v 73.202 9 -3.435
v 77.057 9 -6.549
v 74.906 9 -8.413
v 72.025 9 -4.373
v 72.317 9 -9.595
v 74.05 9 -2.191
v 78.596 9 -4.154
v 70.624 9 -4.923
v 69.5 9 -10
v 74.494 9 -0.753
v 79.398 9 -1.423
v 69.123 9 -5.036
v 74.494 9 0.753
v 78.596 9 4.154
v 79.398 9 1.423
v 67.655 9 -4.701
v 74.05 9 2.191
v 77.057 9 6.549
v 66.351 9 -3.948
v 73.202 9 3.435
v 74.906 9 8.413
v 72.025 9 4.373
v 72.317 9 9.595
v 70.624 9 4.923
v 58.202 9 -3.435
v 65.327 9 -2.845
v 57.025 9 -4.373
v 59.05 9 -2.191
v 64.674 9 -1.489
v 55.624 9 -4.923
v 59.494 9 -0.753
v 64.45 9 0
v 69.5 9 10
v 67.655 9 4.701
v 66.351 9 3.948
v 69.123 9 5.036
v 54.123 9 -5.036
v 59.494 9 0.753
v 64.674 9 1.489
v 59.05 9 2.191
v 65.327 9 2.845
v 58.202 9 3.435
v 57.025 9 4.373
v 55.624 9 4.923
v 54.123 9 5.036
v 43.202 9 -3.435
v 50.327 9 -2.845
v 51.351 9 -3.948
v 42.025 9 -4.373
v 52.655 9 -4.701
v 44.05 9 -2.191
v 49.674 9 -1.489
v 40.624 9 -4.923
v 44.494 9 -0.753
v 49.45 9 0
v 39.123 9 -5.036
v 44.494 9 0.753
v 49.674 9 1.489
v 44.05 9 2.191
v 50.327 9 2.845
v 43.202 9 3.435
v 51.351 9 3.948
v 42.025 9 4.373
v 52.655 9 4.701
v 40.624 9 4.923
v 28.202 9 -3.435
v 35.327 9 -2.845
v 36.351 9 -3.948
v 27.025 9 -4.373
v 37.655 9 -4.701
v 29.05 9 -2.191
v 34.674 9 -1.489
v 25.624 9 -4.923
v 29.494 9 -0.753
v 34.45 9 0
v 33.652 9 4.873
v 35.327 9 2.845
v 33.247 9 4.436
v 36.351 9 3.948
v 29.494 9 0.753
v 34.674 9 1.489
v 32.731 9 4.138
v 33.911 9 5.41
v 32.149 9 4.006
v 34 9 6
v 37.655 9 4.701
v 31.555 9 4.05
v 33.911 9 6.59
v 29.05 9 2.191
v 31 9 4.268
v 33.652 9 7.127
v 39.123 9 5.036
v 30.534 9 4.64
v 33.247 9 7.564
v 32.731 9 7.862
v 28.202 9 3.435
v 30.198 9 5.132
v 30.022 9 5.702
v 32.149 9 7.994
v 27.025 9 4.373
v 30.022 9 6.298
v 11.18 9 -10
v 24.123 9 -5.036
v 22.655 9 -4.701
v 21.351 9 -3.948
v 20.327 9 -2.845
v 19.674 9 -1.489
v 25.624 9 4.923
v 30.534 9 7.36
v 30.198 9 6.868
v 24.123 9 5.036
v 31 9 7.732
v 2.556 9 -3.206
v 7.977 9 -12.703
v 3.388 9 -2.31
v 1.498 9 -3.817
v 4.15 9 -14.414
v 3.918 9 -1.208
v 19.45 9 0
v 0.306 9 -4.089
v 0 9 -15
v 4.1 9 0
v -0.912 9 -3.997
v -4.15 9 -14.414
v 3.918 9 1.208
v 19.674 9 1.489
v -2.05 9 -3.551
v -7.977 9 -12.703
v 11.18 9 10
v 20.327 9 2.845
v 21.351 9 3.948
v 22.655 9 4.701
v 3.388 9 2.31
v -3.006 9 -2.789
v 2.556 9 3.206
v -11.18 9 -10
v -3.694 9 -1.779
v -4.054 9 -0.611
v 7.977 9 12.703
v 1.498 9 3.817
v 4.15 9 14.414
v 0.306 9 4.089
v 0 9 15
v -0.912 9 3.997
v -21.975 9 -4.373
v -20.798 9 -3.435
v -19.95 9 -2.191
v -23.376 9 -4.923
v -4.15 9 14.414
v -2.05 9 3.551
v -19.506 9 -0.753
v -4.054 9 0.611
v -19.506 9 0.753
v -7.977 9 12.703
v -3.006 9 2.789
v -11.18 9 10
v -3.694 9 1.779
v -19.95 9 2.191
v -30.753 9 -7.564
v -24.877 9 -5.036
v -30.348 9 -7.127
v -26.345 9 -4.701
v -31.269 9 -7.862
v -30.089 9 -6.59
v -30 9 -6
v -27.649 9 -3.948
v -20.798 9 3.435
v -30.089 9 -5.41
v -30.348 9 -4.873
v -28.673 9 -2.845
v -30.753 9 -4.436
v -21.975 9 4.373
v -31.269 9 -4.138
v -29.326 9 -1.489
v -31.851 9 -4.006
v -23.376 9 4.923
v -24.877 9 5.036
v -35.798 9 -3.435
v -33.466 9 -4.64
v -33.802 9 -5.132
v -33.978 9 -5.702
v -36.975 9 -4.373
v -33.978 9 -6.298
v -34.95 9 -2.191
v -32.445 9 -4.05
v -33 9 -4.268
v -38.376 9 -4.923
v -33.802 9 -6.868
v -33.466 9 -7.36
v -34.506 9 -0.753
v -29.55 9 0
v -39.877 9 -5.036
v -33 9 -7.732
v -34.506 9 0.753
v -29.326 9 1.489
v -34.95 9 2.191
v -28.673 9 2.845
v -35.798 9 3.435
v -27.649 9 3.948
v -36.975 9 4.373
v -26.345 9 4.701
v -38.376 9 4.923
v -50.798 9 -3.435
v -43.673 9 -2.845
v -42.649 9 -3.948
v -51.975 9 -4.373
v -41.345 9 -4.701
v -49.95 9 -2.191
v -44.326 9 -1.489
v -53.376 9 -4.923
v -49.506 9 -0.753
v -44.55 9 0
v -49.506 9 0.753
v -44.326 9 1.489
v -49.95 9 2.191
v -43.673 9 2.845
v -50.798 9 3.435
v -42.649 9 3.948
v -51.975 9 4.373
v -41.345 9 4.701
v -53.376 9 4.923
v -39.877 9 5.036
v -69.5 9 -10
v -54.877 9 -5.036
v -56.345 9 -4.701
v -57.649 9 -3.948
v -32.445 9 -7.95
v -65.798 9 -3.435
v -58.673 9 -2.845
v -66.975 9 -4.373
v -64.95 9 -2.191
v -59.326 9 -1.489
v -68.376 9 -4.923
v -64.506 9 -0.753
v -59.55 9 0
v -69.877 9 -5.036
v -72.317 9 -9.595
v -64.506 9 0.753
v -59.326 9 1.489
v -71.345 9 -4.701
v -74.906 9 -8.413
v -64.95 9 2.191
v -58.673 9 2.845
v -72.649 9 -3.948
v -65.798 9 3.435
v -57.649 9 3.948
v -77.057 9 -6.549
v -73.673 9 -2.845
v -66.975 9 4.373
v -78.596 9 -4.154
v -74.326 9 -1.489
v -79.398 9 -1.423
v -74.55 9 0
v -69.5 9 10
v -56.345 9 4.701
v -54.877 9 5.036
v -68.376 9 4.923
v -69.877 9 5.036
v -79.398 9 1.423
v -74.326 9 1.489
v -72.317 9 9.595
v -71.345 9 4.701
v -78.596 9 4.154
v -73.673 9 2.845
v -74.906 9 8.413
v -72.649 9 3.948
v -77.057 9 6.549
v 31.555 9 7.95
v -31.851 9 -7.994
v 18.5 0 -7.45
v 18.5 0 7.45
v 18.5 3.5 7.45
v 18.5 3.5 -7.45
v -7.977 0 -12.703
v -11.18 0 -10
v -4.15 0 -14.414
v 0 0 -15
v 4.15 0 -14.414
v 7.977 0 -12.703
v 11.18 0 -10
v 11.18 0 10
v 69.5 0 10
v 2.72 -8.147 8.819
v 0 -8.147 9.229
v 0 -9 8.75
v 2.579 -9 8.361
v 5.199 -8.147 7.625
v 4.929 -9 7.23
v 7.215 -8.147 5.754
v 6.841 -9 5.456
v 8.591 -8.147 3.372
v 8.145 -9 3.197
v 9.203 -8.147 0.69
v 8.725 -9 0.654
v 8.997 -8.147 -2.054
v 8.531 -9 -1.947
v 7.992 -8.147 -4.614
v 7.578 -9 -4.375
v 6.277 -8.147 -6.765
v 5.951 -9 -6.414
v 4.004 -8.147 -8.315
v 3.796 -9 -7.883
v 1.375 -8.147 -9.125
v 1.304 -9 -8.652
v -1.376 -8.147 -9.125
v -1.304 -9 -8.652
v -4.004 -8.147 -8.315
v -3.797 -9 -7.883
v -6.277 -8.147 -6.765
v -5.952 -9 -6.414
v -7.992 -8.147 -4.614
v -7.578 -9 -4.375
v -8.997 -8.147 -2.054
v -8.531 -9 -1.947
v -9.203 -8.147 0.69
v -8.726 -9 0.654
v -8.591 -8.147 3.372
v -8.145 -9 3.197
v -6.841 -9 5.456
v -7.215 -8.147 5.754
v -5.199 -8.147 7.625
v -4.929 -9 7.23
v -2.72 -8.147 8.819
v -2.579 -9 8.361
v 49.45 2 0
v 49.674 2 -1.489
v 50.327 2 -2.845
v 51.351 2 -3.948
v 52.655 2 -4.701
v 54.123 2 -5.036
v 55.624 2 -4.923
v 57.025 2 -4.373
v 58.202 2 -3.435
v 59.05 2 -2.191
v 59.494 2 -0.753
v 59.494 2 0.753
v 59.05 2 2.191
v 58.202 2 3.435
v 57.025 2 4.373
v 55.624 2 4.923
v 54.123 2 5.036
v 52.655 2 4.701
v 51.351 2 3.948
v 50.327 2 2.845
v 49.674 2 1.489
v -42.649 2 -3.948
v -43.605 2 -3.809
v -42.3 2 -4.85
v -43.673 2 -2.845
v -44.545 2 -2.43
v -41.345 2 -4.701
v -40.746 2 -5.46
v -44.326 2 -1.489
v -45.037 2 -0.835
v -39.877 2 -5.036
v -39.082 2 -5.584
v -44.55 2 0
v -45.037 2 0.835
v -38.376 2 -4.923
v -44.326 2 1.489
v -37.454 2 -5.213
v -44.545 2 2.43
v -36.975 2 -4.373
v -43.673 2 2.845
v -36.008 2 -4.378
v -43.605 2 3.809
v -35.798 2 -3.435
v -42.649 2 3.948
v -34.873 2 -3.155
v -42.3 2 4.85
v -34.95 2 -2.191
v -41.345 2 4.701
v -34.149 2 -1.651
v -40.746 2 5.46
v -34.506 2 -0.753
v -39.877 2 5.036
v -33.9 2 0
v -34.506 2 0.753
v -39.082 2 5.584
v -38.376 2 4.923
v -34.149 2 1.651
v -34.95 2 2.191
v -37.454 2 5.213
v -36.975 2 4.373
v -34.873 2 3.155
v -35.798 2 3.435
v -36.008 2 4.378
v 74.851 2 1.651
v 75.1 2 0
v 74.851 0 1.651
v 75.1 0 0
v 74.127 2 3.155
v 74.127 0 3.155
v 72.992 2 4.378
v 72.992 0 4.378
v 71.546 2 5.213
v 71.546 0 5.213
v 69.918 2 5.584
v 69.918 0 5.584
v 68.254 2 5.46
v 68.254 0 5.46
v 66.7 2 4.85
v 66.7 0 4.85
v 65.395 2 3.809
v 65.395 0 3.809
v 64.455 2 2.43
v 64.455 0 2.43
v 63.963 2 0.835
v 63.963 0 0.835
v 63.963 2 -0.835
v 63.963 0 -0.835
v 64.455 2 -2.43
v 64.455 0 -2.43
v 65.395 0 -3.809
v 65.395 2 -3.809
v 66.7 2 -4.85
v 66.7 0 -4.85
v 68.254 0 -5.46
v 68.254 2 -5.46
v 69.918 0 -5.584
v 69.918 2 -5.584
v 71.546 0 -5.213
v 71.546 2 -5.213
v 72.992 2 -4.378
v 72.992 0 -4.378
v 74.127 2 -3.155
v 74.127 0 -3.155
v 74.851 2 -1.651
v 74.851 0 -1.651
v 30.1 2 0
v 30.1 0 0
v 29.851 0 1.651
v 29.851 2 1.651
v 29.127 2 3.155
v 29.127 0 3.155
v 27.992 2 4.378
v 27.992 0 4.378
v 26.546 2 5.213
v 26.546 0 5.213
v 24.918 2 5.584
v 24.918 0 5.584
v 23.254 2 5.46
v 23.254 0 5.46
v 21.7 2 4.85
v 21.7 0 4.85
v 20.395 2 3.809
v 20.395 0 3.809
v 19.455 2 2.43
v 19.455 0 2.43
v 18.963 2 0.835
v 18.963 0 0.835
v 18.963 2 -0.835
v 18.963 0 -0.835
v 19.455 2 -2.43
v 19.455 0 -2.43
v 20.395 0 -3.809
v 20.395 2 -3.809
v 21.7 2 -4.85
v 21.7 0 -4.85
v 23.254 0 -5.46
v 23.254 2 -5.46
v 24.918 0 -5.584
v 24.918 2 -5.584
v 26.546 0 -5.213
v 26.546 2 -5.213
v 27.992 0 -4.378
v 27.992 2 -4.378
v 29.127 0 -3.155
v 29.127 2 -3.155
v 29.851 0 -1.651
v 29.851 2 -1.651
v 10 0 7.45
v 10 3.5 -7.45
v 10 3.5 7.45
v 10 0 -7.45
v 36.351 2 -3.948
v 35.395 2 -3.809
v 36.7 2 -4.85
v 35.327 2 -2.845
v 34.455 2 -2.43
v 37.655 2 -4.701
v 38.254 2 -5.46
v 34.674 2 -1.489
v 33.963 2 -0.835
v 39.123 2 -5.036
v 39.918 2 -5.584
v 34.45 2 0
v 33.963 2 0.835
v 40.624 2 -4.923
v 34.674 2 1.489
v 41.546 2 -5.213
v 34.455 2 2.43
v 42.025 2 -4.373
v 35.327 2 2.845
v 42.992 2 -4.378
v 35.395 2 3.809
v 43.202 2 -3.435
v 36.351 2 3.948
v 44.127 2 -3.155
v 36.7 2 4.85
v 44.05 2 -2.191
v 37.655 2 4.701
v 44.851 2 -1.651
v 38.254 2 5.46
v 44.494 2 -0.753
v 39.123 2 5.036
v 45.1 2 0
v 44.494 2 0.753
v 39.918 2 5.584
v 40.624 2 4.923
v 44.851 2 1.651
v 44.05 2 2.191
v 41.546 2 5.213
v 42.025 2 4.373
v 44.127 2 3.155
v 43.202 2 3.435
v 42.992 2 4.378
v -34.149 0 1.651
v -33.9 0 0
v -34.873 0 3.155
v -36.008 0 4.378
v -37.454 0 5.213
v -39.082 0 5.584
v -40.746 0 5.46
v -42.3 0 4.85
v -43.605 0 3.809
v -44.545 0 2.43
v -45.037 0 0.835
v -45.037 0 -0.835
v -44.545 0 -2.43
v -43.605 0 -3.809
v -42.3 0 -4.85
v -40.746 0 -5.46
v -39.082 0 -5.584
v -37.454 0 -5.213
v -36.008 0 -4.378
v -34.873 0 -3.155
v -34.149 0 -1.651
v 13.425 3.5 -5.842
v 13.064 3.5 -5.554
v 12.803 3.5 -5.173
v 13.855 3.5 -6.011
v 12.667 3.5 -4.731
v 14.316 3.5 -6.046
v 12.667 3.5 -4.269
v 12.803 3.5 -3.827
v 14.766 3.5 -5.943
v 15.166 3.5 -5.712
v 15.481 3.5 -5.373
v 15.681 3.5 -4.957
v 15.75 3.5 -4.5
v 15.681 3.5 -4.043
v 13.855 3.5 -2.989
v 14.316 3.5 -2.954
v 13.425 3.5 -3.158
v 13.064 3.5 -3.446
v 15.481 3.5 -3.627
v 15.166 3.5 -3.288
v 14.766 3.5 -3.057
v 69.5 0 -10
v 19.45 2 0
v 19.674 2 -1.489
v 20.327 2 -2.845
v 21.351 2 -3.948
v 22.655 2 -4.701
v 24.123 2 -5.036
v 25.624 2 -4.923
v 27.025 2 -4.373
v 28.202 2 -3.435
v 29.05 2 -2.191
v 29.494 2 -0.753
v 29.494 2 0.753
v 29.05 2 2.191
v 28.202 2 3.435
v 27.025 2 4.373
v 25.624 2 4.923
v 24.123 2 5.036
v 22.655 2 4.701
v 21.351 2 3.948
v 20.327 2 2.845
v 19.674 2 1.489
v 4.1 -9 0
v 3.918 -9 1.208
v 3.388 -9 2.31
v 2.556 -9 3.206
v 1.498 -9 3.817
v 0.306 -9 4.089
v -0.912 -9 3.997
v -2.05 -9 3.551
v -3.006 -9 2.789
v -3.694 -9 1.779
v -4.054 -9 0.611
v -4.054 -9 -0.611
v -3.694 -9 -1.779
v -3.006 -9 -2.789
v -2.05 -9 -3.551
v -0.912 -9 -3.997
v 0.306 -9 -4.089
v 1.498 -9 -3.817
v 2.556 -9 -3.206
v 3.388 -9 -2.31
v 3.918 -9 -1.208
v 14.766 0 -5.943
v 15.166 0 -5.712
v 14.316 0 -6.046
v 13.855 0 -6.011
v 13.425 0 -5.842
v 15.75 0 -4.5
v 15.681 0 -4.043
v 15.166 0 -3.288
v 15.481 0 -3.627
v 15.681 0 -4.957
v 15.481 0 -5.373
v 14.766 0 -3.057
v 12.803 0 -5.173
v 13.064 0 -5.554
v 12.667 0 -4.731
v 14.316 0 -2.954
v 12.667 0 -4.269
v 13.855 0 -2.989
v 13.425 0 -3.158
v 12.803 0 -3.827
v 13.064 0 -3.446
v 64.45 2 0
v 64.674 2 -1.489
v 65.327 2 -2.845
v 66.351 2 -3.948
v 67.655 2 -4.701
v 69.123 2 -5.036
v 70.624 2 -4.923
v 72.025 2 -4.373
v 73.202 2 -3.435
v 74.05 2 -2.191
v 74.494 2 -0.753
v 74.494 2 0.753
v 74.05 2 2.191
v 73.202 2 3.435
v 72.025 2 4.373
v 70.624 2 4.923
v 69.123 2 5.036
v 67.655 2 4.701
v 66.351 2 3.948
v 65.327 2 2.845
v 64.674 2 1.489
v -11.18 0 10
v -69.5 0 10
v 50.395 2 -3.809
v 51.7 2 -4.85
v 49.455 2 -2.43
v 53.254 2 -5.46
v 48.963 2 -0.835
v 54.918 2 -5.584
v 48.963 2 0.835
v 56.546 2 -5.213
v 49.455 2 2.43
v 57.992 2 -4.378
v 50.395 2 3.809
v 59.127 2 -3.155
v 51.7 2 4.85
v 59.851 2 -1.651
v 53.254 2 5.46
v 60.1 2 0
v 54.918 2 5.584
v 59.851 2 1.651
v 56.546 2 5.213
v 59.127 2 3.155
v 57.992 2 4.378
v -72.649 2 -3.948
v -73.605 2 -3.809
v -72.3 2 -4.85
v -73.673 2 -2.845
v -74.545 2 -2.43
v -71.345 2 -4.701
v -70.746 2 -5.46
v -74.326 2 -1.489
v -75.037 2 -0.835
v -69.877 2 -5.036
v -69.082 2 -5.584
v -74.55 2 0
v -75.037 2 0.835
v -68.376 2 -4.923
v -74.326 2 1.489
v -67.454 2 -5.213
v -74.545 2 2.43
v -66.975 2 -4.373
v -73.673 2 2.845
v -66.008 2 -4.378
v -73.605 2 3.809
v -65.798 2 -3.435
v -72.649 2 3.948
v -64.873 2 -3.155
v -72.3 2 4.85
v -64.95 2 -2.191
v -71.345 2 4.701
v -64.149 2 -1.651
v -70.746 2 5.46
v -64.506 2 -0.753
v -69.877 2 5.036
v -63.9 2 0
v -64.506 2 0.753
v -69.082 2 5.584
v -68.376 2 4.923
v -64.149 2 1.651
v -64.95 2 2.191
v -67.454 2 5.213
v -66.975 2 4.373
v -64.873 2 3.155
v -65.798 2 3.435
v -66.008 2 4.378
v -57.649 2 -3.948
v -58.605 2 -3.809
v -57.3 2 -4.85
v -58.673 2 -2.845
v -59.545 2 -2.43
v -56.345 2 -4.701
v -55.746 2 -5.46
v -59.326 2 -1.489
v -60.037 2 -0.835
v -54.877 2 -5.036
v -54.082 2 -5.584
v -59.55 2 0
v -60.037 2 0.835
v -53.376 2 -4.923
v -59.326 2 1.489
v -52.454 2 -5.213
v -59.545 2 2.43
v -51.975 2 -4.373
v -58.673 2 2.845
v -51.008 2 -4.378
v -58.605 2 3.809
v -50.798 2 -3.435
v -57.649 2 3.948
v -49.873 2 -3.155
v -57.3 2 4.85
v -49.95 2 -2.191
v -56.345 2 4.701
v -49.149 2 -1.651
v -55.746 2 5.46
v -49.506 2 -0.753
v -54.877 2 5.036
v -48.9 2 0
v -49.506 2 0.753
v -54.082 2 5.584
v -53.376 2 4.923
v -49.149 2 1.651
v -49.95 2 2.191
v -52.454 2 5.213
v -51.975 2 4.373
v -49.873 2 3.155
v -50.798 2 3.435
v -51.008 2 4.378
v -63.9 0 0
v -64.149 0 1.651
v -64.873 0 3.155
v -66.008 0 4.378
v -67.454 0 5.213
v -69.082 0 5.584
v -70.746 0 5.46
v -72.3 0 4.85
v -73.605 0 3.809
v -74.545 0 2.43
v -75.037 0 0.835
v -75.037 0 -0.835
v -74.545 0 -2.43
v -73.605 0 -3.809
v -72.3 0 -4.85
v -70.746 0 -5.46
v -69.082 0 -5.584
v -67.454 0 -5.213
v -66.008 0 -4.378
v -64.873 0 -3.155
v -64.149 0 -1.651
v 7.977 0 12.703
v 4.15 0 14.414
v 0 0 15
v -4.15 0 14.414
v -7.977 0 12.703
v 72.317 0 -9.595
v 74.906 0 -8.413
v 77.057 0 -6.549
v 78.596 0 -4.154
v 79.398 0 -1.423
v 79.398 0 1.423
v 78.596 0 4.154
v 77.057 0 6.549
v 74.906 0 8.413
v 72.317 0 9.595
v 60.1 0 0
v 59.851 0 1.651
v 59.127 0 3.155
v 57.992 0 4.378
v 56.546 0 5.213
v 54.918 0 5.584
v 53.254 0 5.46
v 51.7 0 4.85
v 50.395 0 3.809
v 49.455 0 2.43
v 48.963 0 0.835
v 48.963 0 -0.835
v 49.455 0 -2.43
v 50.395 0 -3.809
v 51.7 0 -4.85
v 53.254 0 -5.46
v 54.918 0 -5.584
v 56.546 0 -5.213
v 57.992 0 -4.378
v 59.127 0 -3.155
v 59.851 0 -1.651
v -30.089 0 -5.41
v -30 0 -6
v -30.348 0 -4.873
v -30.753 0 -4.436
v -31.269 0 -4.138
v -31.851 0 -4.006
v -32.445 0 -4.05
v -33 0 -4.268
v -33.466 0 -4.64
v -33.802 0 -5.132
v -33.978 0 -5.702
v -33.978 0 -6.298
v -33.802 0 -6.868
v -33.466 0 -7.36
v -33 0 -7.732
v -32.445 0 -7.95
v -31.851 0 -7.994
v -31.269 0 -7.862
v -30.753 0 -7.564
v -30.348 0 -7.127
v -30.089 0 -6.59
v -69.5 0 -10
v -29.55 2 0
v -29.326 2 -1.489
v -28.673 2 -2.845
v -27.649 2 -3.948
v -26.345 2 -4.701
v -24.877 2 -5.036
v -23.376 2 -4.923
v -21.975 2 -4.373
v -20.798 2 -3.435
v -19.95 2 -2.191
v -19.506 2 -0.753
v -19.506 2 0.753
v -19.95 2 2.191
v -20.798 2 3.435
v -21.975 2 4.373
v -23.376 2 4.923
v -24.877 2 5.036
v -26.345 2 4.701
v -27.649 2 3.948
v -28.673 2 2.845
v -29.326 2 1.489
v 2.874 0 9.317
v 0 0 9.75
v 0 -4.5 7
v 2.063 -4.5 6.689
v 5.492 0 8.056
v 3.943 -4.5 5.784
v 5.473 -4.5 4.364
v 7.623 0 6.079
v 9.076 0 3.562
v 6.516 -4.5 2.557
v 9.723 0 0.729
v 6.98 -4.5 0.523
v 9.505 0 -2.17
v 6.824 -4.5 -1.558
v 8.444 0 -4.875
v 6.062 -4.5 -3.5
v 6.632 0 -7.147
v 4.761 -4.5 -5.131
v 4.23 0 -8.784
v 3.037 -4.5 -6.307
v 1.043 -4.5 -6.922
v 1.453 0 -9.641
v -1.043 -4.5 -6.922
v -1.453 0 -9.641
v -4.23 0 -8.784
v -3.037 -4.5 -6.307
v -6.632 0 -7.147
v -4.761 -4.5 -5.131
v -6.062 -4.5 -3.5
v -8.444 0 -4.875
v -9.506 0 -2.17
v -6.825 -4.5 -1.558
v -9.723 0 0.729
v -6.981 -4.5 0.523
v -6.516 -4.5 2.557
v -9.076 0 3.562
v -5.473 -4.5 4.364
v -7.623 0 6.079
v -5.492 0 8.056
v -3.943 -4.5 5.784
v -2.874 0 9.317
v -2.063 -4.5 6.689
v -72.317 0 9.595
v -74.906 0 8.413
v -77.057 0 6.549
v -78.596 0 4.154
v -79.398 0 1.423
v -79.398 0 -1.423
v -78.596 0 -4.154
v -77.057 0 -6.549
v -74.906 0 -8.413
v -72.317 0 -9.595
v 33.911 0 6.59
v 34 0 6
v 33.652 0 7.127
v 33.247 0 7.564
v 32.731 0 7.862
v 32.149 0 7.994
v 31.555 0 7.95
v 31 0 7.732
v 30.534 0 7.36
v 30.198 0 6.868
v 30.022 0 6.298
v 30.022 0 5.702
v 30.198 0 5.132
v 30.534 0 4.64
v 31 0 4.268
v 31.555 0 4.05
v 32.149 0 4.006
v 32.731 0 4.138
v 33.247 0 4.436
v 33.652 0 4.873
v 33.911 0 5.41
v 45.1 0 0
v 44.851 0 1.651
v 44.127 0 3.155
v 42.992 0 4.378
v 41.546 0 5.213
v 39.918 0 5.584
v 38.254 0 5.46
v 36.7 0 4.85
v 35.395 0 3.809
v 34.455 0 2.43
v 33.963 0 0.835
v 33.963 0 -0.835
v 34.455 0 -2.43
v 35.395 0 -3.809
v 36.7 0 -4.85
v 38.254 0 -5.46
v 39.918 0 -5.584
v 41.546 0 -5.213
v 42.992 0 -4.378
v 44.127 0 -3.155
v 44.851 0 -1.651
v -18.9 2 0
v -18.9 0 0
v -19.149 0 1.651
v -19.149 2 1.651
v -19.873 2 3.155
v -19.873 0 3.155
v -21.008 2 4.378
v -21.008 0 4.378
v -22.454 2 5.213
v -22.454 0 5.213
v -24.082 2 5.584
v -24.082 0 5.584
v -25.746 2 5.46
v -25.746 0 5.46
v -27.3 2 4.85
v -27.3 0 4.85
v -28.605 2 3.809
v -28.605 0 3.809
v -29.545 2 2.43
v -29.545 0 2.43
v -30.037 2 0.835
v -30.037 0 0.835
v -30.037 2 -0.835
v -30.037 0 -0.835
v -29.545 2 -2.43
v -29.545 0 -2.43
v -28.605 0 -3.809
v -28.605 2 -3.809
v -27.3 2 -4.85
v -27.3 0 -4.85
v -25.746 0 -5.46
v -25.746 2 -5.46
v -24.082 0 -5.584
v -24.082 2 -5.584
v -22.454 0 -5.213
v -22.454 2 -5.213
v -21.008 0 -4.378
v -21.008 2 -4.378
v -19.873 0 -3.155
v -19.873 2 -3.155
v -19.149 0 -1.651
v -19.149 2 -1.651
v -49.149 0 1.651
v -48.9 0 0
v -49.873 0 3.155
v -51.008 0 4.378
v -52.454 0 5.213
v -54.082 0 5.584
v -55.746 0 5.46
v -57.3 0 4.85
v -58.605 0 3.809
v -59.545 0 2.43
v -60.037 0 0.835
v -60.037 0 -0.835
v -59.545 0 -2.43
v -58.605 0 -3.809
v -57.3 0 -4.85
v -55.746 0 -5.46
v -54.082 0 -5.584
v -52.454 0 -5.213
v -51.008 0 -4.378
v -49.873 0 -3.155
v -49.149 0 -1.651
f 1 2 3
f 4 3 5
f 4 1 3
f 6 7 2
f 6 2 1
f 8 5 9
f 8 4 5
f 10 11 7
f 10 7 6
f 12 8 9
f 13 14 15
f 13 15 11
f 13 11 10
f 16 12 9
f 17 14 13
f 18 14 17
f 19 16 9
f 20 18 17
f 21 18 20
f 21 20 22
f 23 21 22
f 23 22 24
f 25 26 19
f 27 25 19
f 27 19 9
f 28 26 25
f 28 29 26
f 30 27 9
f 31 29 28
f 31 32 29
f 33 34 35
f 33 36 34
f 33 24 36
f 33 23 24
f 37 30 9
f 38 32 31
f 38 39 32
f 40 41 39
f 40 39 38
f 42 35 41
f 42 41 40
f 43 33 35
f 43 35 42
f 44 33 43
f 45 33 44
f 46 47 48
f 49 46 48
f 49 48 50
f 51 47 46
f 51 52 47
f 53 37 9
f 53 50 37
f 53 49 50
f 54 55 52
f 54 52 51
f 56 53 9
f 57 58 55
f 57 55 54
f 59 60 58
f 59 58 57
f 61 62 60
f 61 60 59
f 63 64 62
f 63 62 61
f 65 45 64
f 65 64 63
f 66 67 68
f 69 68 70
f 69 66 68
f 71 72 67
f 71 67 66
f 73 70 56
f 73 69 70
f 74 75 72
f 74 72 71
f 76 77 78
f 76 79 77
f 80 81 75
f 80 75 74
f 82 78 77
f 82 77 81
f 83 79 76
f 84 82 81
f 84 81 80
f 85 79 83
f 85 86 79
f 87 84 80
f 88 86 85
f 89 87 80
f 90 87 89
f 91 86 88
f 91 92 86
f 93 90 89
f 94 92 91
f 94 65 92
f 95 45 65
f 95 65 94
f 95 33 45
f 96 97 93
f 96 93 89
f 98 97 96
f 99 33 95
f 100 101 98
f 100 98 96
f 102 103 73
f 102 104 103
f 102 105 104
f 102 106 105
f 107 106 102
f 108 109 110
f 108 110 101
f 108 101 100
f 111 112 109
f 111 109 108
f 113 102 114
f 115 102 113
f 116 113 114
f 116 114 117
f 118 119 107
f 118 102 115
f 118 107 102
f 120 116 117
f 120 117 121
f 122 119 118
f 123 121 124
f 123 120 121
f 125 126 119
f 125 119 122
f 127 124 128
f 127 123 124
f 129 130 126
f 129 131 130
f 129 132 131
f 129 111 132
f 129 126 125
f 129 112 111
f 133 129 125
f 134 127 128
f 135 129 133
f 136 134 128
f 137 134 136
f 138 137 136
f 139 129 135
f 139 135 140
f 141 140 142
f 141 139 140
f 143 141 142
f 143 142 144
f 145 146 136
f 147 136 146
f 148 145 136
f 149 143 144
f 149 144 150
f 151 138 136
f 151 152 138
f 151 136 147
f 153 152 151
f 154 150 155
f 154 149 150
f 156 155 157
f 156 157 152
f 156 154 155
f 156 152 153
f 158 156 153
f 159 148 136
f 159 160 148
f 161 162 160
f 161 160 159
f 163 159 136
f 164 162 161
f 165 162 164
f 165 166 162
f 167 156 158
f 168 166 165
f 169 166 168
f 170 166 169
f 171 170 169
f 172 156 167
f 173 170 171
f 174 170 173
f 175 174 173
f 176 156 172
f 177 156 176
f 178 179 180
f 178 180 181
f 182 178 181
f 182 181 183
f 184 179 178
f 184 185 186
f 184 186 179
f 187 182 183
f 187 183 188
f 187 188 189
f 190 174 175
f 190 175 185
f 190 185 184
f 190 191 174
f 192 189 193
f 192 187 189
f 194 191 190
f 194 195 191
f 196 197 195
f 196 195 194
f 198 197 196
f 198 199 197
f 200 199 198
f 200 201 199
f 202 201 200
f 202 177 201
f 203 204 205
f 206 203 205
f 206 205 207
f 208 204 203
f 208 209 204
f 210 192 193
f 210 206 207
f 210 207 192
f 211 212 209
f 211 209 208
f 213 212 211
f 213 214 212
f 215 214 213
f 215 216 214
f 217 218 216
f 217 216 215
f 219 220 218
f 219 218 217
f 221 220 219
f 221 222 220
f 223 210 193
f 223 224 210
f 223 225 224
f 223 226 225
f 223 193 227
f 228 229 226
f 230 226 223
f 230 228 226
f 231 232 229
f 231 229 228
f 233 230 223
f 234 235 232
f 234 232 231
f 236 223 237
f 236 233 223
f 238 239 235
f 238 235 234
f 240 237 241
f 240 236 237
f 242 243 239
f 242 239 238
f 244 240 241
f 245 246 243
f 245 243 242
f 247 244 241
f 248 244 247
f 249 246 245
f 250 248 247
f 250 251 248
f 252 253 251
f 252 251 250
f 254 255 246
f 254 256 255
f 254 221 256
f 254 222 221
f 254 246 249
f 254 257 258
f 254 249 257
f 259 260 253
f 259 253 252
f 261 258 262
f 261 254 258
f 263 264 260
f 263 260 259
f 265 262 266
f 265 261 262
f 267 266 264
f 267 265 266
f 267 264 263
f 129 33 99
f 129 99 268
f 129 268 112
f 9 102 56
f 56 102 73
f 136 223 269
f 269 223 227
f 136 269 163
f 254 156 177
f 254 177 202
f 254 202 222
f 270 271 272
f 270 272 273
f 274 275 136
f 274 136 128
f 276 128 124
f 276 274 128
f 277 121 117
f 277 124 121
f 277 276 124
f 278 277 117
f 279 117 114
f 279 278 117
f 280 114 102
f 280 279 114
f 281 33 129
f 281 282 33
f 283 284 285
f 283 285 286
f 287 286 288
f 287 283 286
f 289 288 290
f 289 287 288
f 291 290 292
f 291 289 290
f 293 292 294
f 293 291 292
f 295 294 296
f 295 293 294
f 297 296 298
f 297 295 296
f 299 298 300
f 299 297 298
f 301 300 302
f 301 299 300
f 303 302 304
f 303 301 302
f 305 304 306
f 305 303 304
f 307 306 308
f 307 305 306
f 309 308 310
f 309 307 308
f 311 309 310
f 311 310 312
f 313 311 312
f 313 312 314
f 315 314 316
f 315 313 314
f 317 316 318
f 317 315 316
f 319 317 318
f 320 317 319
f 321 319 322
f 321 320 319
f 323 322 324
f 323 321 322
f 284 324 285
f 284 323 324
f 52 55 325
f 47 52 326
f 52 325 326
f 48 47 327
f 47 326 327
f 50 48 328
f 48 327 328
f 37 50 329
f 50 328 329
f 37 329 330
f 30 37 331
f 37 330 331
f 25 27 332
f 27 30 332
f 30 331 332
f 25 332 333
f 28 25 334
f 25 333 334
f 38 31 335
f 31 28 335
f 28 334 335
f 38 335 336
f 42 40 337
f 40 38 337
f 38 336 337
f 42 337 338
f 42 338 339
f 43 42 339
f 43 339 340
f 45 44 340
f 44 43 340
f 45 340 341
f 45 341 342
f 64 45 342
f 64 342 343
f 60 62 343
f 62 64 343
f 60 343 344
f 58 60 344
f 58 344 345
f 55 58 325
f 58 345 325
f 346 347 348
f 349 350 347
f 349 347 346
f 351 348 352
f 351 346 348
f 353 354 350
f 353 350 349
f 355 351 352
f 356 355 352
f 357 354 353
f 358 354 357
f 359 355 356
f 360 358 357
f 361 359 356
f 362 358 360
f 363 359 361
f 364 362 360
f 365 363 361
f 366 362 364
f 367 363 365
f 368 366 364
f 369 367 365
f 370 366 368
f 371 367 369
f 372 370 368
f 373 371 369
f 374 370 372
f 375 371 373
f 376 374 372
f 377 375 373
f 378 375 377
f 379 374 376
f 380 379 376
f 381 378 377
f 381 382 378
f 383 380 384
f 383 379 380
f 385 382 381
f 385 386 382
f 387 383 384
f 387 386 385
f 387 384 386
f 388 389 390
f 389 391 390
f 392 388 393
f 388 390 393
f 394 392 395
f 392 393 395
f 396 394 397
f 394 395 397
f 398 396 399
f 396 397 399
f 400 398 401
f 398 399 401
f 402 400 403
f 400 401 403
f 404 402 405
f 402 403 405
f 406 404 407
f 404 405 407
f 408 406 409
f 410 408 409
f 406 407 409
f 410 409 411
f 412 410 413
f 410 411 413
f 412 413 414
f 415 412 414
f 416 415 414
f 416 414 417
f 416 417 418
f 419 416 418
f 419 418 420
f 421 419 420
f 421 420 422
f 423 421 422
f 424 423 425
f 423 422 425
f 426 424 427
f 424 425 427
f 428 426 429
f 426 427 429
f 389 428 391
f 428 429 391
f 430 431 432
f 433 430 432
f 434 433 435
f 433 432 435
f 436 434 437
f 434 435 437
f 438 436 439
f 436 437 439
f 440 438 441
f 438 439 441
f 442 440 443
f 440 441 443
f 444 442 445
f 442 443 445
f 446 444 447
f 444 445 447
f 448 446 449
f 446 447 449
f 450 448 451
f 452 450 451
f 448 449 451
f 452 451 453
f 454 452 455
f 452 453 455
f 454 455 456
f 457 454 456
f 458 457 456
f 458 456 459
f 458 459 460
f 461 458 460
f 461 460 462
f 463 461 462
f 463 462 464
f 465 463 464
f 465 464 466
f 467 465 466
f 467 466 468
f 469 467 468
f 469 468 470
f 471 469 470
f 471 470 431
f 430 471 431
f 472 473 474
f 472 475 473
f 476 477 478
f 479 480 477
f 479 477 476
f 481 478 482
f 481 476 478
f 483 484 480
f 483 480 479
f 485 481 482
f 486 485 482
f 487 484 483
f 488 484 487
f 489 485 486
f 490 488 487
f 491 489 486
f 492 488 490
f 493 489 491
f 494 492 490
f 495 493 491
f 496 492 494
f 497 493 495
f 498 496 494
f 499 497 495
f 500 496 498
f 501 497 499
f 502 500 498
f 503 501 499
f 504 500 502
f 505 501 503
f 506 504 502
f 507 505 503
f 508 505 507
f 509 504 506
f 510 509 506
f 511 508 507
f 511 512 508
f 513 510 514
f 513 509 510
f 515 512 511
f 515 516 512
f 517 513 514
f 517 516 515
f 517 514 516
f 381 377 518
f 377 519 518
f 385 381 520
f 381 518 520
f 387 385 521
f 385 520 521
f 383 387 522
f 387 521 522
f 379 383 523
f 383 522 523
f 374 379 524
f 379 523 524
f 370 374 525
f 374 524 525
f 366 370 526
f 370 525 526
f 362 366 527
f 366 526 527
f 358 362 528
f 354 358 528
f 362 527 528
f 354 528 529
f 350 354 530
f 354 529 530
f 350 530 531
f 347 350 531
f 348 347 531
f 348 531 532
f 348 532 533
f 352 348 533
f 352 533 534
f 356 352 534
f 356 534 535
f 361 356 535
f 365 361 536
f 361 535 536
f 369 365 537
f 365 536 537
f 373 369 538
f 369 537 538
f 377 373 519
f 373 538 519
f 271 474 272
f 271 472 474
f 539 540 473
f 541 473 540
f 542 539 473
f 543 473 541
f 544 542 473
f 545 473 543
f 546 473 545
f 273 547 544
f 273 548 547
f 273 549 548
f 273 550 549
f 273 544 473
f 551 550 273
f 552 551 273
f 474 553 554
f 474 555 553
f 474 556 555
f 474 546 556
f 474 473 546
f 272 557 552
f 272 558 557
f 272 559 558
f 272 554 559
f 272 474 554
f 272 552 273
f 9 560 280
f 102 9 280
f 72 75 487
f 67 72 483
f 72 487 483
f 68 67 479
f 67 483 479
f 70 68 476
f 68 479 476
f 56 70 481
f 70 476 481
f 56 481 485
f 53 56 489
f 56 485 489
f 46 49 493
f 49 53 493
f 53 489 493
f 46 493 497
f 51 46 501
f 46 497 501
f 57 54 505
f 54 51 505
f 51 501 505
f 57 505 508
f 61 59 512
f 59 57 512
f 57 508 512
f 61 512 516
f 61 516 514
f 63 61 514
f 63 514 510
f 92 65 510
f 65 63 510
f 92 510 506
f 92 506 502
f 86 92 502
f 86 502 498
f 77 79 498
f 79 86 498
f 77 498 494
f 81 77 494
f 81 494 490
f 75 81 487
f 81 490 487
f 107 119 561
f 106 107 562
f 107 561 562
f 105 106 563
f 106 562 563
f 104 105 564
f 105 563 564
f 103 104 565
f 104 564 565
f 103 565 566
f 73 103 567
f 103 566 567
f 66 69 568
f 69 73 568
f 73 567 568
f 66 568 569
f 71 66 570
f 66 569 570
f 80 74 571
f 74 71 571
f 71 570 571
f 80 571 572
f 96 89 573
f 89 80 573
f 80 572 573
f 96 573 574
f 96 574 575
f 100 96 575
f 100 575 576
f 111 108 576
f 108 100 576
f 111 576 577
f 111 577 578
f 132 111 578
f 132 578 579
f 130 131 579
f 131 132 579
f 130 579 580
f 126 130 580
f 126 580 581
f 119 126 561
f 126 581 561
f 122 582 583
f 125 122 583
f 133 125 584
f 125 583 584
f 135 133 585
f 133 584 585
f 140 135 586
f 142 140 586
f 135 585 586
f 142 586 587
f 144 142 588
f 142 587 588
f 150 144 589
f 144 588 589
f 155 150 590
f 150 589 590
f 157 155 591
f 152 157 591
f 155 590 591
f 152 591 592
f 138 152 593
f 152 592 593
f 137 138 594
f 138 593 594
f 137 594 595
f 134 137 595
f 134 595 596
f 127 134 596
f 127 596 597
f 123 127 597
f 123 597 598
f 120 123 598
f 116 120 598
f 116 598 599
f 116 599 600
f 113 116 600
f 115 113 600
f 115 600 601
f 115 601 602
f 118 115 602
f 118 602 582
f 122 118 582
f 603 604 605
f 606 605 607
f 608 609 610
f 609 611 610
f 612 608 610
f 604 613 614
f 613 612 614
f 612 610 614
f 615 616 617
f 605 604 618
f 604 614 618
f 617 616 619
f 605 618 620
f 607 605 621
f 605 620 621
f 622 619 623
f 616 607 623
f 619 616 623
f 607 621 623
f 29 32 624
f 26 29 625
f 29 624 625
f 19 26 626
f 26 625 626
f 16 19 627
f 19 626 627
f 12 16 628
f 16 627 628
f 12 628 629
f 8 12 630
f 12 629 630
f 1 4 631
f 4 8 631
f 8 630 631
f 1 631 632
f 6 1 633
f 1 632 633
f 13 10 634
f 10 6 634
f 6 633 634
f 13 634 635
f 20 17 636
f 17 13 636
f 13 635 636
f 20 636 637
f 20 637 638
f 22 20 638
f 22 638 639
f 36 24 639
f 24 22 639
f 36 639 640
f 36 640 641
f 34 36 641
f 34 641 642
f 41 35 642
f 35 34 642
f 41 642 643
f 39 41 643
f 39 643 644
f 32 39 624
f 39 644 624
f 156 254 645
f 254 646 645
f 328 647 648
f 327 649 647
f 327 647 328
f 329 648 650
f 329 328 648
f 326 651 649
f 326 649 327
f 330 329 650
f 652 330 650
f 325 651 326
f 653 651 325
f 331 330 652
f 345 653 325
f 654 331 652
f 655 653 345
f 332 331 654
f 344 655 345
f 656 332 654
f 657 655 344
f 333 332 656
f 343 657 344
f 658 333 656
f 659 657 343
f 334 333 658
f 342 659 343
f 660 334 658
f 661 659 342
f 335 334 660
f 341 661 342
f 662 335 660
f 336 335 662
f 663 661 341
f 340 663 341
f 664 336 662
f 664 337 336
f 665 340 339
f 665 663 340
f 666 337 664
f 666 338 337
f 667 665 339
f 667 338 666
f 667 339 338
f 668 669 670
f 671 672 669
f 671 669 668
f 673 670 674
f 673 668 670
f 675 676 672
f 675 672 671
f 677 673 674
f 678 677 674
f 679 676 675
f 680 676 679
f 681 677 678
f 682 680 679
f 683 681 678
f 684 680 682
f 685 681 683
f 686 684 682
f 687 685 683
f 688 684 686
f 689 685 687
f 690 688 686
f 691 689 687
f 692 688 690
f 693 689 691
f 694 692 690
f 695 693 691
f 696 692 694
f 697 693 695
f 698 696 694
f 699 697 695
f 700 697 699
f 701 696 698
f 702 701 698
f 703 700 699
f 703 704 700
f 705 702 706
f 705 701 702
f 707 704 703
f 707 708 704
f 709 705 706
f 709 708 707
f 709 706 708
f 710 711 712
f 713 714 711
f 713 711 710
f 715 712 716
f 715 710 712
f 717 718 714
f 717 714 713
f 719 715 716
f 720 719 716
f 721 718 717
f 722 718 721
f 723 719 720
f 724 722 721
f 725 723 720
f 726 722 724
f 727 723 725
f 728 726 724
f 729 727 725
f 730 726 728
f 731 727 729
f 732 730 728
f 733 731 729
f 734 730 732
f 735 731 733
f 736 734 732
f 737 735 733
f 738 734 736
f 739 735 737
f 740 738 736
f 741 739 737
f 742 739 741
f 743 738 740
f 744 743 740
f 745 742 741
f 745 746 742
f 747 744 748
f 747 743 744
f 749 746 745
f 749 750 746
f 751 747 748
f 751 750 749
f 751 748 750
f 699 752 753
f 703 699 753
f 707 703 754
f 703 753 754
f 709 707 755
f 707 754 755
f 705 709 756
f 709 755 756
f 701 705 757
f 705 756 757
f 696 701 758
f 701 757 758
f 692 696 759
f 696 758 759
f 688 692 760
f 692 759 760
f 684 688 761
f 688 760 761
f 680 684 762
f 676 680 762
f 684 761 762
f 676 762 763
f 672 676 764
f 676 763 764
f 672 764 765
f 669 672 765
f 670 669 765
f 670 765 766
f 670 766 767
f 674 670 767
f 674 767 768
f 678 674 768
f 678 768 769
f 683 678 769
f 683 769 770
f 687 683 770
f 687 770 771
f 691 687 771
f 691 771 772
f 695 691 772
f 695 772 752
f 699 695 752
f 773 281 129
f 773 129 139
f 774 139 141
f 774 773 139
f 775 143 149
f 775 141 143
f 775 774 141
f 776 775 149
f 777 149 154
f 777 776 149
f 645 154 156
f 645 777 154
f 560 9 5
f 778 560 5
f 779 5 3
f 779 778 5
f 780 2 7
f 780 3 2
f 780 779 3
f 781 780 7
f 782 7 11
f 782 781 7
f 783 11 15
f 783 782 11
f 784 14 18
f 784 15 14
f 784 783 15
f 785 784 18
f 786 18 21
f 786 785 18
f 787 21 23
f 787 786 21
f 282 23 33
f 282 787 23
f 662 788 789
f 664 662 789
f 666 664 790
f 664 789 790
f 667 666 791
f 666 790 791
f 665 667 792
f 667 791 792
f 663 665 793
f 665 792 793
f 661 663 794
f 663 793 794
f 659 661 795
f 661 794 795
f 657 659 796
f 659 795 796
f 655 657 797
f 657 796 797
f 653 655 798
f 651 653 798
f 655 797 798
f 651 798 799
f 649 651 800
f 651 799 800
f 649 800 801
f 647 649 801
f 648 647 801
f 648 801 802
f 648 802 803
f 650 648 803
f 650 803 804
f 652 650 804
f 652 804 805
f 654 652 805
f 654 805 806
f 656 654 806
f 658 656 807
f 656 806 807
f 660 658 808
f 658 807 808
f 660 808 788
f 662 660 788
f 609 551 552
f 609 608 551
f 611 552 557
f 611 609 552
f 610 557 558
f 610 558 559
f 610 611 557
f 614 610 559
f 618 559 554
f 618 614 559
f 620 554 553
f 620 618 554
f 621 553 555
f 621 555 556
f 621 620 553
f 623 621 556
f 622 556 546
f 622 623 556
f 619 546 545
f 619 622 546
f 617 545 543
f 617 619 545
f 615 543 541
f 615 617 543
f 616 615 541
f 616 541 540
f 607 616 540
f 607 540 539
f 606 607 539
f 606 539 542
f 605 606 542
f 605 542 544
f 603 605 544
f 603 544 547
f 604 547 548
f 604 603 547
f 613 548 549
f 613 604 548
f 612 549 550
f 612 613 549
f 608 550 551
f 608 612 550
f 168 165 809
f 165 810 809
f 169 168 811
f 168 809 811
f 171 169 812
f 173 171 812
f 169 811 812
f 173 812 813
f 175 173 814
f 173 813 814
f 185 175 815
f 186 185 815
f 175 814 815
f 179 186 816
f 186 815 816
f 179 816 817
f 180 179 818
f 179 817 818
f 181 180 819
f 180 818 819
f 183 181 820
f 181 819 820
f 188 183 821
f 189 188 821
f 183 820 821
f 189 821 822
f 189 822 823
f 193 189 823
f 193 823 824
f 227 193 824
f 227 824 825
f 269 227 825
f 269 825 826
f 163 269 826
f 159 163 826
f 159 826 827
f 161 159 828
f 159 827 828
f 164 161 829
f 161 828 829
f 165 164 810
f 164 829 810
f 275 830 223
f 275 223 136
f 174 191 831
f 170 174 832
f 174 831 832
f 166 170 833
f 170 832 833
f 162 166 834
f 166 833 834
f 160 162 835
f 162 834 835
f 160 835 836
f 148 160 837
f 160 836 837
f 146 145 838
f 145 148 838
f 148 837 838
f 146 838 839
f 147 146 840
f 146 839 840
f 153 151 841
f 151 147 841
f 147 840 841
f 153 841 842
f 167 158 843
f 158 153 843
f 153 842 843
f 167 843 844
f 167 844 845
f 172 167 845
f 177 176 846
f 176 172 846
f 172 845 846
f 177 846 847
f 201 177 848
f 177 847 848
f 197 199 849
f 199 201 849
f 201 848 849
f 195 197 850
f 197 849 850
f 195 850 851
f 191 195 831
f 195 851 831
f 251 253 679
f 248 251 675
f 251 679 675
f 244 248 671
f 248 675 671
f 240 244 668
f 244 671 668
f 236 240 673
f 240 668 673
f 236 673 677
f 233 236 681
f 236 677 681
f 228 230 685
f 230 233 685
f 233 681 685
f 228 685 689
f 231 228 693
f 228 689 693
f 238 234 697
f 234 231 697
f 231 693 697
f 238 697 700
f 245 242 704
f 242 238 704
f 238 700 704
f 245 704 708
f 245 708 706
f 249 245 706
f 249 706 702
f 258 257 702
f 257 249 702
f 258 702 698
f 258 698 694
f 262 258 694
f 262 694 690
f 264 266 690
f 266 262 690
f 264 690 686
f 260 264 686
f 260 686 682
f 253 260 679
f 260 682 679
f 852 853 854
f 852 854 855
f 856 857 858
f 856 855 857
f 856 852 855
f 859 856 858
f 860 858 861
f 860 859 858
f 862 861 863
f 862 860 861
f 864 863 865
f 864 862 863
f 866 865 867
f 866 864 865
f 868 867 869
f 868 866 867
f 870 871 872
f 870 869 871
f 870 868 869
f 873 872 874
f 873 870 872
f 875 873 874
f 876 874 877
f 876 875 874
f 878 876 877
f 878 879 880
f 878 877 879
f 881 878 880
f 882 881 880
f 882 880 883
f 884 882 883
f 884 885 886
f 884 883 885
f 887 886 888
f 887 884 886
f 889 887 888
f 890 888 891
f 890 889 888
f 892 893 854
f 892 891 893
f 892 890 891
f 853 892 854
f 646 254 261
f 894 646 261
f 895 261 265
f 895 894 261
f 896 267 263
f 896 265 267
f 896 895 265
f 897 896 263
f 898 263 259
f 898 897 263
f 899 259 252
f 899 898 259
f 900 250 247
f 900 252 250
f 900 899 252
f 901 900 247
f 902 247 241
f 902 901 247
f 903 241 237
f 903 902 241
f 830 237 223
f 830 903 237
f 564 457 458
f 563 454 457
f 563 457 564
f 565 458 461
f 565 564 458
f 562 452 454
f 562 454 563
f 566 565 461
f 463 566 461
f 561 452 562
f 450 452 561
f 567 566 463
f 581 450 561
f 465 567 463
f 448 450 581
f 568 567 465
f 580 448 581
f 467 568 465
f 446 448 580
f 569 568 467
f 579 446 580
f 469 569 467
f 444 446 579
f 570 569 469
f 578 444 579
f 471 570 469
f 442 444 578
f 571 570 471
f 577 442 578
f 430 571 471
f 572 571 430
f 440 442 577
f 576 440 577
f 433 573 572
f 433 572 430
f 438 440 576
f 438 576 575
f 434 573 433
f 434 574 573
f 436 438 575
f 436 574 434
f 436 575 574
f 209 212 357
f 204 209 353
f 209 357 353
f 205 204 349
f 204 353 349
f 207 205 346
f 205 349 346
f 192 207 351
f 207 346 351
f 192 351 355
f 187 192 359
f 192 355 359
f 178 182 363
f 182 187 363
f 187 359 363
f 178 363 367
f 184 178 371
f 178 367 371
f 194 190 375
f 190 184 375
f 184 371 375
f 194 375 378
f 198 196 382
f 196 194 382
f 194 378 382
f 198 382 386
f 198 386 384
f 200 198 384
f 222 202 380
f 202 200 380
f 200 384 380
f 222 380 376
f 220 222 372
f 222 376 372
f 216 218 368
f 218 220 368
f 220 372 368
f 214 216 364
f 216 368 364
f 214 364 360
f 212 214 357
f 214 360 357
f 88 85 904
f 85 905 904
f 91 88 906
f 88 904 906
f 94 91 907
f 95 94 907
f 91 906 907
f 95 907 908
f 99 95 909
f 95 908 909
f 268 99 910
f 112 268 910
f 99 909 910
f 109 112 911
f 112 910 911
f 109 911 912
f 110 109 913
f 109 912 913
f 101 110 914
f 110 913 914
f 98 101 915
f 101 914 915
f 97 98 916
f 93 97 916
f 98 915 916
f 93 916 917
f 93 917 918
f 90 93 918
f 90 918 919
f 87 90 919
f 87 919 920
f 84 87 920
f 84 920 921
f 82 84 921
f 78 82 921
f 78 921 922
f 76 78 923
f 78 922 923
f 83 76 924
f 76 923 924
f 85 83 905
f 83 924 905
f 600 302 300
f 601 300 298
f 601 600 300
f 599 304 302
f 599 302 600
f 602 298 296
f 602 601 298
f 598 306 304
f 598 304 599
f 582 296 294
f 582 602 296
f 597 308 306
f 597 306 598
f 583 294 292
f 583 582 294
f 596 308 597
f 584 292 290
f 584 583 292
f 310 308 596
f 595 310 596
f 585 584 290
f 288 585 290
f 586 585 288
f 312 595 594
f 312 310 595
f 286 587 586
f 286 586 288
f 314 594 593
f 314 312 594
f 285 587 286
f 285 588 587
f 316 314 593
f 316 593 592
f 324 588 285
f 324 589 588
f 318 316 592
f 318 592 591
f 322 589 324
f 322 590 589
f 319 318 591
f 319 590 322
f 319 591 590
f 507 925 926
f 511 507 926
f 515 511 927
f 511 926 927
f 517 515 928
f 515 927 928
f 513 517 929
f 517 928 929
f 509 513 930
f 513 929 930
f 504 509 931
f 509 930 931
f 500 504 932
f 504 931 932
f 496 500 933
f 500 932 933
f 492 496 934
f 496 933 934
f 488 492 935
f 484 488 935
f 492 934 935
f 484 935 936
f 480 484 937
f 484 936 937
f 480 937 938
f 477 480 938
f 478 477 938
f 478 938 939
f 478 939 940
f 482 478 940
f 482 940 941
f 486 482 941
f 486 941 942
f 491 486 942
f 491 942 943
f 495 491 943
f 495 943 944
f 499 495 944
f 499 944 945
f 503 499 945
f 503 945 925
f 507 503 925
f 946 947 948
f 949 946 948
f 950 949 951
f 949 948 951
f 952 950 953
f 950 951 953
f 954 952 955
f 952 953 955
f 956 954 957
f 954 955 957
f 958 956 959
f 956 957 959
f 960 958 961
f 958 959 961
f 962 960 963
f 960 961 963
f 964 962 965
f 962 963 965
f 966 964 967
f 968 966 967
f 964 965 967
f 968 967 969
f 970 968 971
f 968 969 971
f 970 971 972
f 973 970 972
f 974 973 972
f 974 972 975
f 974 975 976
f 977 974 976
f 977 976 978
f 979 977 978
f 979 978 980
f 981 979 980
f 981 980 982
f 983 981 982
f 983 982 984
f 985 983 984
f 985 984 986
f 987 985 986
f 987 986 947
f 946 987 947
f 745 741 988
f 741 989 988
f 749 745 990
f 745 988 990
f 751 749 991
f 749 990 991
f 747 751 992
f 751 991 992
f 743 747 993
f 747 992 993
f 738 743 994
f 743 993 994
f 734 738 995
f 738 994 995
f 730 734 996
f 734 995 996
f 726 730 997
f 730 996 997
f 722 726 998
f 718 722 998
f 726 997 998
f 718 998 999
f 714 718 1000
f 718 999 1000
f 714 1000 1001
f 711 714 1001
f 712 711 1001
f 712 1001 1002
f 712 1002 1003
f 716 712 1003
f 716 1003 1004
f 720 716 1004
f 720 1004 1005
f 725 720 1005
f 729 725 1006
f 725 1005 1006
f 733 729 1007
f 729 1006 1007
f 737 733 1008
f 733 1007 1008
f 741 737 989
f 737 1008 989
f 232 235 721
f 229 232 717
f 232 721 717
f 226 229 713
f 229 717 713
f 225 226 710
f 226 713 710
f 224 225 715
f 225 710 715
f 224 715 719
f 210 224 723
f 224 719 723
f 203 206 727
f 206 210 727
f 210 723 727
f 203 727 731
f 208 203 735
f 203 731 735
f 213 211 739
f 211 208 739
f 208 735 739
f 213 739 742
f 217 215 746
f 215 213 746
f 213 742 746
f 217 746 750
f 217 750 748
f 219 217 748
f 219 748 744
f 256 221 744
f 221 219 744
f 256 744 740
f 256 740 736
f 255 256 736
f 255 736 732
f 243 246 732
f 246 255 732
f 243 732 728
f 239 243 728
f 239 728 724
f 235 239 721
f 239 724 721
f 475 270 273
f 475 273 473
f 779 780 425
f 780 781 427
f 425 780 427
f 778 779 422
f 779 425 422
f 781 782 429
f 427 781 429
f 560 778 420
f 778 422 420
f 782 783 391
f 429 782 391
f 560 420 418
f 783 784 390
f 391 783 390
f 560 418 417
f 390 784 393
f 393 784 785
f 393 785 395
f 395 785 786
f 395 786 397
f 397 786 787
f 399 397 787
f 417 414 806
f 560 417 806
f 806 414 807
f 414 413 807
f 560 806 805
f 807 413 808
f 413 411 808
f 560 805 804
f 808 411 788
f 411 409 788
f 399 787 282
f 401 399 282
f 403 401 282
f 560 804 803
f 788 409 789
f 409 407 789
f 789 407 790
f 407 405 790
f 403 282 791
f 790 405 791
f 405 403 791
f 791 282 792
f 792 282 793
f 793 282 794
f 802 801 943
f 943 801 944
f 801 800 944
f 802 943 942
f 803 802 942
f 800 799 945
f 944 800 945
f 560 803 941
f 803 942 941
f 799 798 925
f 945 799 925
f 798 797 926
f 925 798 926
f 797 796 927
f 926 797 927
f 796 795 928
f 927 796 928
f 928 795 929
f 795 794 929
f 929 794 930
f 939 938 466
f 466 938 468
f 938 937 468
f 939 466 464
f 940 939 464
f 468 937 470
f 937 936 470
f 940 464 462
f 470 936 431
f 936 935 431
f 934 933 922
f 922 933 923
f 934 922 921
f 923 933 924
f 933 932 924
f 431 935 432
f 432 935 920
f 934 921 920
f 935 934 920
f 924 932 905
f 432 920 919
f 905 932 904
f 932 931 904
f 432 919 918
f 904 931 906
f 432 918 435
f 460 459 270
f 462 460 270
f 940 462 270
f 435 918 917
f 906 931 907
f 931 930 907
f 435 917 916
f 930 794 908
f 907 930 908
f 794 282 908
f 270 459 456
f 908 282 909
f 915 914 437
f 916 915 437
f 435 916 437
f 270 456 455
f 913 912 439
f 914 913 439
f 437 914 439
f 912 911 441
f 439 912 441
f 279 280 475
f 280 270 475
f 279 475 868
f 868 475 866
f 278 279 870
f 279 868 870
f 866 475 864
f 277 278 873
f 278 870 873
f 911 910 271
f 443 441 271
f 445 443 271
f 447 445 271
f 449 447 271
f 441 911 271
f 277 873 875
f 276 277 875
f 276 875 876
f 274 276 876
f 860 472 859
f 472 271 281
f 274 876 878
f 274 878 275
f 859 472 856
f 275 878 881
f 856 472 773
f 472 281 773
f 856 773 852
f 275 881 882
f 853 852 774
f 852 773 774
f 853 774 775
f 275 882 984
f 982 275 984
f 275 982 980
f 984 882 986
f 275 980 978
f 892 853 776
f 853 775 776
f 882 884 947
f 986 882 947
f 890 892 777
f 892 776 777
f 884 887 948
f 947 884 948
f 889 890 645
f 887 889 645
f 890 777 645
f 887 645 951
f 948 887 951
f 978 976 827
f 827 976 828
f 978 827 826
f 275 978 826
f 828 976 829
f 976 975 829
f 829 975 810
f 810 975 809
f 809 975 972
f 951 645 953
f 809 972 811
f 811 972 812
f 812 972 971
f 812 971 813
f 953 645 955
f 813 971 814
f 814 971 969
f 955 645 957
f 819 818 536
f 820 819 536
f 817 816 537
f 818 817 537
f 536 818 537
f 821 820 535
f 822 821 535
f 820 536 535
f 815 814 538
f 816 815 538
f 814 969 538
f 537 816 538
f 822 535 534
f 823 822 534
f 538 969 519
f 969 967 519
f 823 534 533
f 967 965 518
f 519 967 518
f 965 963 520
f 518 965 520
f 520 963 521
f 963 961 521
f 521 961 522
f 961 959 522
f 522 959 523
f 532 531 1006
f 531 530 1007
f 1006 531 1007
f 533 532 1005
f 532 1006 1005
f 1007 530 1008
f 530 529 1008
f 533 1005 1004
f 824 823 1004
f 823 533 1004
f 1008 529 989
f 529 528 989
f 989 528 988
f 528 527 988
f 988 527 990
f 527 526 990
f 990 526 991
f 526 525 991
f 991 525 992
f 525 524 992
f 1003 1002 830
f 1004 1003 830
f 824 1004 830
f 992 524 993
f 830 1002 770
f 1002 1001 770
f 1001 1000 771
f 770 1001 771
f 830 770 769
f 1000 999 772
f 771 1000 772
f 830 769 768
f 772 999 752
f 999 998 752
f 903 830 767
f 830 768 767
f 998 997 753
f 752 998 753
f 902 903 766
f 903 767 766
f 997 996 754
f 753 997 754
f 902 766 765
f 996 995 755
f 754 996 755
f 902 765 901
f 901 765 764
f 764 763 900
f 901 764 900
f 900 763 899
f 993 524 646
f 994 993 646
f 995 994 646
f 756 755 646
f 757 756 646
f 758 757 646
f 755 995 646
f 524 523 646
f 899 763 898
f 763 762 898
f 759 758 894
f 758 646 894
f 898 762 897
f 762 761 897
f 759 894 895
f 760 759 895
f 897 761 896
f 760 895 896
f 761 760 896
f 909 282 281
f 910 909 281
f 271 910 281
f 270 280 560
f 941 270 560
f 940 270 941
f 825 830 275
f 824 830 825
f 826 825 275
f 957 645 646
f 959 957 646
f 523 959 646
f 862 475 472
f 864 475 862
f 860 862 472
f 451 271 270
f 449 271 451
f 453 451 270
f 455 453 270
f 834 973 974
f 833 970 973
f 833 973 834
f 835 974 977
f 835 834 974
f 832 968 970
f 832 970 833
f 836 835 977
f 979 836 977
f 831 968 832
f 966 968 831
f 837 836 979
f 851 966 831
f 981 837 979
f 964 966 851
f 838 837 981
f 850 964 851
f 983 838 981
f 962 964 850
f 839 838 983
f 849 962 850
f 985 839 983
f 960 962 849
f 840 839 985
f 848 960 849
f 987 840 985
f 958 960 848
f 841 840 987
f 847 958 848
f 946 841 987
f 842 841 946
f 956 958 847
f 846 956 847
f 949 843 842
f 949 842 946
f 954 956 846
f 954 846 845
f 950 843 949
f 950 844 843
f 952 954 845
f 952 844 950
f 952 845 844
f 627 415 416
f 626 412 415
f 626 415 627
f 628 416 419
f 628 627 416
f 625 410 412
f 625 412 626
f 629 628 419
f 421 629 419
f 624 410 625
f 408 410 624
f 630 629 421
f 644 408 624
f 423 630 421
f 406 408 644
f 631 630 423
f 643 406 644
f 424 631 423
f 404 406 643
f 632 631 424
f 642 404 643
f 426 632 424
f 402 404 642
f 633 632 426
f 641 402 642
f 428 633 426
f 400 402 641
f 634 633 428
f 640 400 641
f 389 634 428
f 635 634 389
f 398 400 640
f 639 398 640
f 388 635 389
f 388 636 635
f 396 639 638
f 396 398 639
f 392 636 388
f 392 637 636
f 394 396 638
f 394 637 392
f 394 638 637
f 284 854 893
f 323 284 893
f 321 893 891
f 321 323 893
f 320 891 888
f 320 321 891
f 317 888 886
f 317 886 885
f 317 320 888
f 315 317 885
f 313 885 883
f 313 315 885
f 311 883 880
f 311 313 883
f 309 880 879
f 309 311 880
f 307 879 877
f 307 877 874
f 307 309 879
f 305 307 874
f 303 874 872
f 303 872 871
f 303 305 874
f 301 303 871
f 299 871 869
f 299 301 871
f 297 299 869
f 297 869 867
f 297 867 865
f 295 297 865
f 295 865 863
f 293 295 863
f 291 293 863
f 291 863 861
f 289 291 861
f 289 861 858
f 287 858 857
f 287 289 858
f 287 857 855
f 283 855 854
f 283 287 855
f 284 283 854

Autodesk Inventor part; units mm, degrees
ref_plane "YZ Plane" through (0, 0, 0) normal (1, 0, 0) x (0, 1, 0)
ref_plane "XZ Plane" through (0, 0, 0) normal (0, 1, 0) x (-1, 0, 0)
ref_plane "XY Plane" through (0, 0, 0) normal (0, 0, 1) x (1, 0, 0)
sketch "Sketch1" plane through (0, 0, 0) normal (0, 1, 0) x (-1, 0, 0)
  circle A0 centre (24.5, 0) radius 5.05
  circle A1 centre (39.5, 0) radius 5.05
  circle A2 centre (54.5, 0) radius 5.05
  circle A3 centre (69.5, 0) radius 5.05
  circle A4 centre (-69.5, 0) radius 5.05
  circle A5 centre (-54.5, 0) radius 5.05
  circle A6 centre (-39.5, 0) radius 5.05
  circle A7 centre (-24.5, 0) radius 5.05
  line L0 (69.5, -10) -> (11.1803, -10)
  line L1 (69.5, 10) -> (11.1803, 10)
  arc A8 (69.5, -10) -> (69.5, 10) centre (69.5, 0) ccw
  line L2 (-69.5, -10) -> (-11.1803, -10)
  arc A9 (-69.5, 10) -> (-69.5, -10) centre (-69.5, 0) ccw
  line L3 (-69.5, 10) -> (-11.1803, 10)
  arc A10 (11.1803, 10) -> (-11.1803, 10) centre (0, 0) ccw
  arc A11 (-11.1803, -10) -> (11.1803, -10) centre (0, 0) ccw
  dimension "d1" = 10.1
  dimension "d2" = 10.1
  dimension "d3" = 10.1
  dimension "d4" = 10.1
  dimension "d5" = 24.5
  dimension "d6" = 15
  dimension "d7" = 15
  dimension "d8" = 15
  dimension "d11" = 360
  dimension "d16" = 360
extrude "Extrusion1" add sketch "Sketch1" along normal blind 9
sketch "Sketch2" plane through (0, 0, 0) normal (0, -1, 0) x (1, 0, 0)
  circle A0 centre (-69.5, 0) radius 5.05 projected
  circle A1 centre (-54.5, 0) radius 5.05 projected
  circle A2 centre (-39.5, 0) radius 5.05 projected
  circle A3 centre (-24.5, 0) radius 5.05 projected
  circle A4 centre (24.5, 0) radius 5.05 projected
  circle A5 centre (39.5, 0) radius 5.05 projected
  circle A6 centre (54.5, 0) radius 5.05 projected
  circle A7 centre (69.5, 0) radius 5.05 projected
  circle A8 centre (-69.5, 0) radius 5.6
  circle A9 centre (-54.5, 0) radius 5.6
  circle A10 centre (-39.5, 0) radius 5.6
  circle A11 centre (-24.5, 0) radius 5.6
  circle A12 centre (24.5, 0) radius 5.6
  circle A13 centre (39.5, 0) radius 5.6
  circle A14 centre (54.5, 0) radius 5.6
  circle A15 centre (69.5, 0) radius 5.6
  point P0 (0, 0)
  dimension "d20" = 11.2
  dimension "d21" = 11.2
  dimension "d22" = 11.2
  dimension "d23" = 11.2
  dimension "d24" = 11.2
  dimension "d25" = 11.2
  dimension "d26" = 11.2
  dimension "d27" = 11.2
extrude "Extrusion2" cut sketch "Sketch2" against normal blind 2
sketch "Sketch5" plane through (0, 0, 0) normal (0, -1, 0) x (1, 0, 0)
  line L0 (9.9999, 7.45) -> (18.4999, 7.45)
  line L1 (18.4999, 7.45) -> (18.4999, -7.45)
  line L2 (18.4999, -7.45) -> (9.9999, -7.45)
  line L3 (9.9999, -7.45) -> (9.9999, 7.45)
  line L4 (69.5, 10) -> (11.1803, 10) projected
  circle A0 centre (14.1999, -4.5) radius 1.55
  point P0 (0, 0)
  point P1 (9.7499, -0.0369)
  dimension "d52" = 8.5
  dimension "d53" = 14.9
  dimension "d54" = 2.55
  dimension "d55" = 0.25
  dimension "d56" = 3.1
  dimension "d57" = 2.95
extrude "Extrusion4" cut sketch "Sketch5" against normal blind 3.5
sketch "Sketch6" plane through (0, 0, 0) normal (0, -1, 0) x (1, 0, 0)
  circle A0 centre (32, 6) radius 2
  circle A1 centre (24.5, 0) radius 5.05 projected
  circle A2 centre (-32, -6) radius 2
  circle A3 centre (-24.5, 0) radius 5.05 projected
  point P0 (0, 0)
  dimension "d60" = 4
  dimension "d61" = 7.5
  dimension "d62" = 6
  dimension "d63" = 4
  dimension "d64" = 7.5
  dimension "d65" = 6
extrude "Extrusion5" cut sketch "Sketch6" against normal through all contours A0 | A2
sketch "Sketch8" plane through (0, 0, 0) normal (0, -1, 0) x (1, 0, 0)
  point P0 (0, 0)
  point P1 (0, 0)
ref_plane "Work Plane1" through (-0.0001, 0, 7.45) normal (1, 0, 0) x (0, 0, -1)
sketch "Sketch9" plane through (-0.0001, 0, 7.45) normal (1, 0, 0) x (0, 0, -1)
  line L0 (7.45, 0) -> (-2.3, 0)
  line L1 (-2.55, 0) -> (17.45, 0) projected
  line L2 (7.45, 0) -> (7.45, -9)
  line L3 (7.45, -9) -> (-2.3, -9)
  line L4 (-2.3, -9) -> (0.45, -4.5)
  line L5 (-2.3, 0) -> (0.45, -4.5)
  dimension "d74" = 9
revolve "Revolution1" add sketch "Sketch9" angle 360 about axis through (-0.0001, 0, 0) along (0, -1, 0)
sketch "Sketch10" plane through (-0.0001, -9, 0) normal (0, -1, 0) x (1, 0, 0)
  circle A0 centre (0.0001, 0) radius 4.1
  dimension "d76" = 8.2
extrude "Extrusion6" cut sketch "Sketch10" against normal through all
chamfer "Chamfer1" distance 1 angle 45 1 edges at (-0.0001, -9, -9.75)
properties part number "led-prop"
